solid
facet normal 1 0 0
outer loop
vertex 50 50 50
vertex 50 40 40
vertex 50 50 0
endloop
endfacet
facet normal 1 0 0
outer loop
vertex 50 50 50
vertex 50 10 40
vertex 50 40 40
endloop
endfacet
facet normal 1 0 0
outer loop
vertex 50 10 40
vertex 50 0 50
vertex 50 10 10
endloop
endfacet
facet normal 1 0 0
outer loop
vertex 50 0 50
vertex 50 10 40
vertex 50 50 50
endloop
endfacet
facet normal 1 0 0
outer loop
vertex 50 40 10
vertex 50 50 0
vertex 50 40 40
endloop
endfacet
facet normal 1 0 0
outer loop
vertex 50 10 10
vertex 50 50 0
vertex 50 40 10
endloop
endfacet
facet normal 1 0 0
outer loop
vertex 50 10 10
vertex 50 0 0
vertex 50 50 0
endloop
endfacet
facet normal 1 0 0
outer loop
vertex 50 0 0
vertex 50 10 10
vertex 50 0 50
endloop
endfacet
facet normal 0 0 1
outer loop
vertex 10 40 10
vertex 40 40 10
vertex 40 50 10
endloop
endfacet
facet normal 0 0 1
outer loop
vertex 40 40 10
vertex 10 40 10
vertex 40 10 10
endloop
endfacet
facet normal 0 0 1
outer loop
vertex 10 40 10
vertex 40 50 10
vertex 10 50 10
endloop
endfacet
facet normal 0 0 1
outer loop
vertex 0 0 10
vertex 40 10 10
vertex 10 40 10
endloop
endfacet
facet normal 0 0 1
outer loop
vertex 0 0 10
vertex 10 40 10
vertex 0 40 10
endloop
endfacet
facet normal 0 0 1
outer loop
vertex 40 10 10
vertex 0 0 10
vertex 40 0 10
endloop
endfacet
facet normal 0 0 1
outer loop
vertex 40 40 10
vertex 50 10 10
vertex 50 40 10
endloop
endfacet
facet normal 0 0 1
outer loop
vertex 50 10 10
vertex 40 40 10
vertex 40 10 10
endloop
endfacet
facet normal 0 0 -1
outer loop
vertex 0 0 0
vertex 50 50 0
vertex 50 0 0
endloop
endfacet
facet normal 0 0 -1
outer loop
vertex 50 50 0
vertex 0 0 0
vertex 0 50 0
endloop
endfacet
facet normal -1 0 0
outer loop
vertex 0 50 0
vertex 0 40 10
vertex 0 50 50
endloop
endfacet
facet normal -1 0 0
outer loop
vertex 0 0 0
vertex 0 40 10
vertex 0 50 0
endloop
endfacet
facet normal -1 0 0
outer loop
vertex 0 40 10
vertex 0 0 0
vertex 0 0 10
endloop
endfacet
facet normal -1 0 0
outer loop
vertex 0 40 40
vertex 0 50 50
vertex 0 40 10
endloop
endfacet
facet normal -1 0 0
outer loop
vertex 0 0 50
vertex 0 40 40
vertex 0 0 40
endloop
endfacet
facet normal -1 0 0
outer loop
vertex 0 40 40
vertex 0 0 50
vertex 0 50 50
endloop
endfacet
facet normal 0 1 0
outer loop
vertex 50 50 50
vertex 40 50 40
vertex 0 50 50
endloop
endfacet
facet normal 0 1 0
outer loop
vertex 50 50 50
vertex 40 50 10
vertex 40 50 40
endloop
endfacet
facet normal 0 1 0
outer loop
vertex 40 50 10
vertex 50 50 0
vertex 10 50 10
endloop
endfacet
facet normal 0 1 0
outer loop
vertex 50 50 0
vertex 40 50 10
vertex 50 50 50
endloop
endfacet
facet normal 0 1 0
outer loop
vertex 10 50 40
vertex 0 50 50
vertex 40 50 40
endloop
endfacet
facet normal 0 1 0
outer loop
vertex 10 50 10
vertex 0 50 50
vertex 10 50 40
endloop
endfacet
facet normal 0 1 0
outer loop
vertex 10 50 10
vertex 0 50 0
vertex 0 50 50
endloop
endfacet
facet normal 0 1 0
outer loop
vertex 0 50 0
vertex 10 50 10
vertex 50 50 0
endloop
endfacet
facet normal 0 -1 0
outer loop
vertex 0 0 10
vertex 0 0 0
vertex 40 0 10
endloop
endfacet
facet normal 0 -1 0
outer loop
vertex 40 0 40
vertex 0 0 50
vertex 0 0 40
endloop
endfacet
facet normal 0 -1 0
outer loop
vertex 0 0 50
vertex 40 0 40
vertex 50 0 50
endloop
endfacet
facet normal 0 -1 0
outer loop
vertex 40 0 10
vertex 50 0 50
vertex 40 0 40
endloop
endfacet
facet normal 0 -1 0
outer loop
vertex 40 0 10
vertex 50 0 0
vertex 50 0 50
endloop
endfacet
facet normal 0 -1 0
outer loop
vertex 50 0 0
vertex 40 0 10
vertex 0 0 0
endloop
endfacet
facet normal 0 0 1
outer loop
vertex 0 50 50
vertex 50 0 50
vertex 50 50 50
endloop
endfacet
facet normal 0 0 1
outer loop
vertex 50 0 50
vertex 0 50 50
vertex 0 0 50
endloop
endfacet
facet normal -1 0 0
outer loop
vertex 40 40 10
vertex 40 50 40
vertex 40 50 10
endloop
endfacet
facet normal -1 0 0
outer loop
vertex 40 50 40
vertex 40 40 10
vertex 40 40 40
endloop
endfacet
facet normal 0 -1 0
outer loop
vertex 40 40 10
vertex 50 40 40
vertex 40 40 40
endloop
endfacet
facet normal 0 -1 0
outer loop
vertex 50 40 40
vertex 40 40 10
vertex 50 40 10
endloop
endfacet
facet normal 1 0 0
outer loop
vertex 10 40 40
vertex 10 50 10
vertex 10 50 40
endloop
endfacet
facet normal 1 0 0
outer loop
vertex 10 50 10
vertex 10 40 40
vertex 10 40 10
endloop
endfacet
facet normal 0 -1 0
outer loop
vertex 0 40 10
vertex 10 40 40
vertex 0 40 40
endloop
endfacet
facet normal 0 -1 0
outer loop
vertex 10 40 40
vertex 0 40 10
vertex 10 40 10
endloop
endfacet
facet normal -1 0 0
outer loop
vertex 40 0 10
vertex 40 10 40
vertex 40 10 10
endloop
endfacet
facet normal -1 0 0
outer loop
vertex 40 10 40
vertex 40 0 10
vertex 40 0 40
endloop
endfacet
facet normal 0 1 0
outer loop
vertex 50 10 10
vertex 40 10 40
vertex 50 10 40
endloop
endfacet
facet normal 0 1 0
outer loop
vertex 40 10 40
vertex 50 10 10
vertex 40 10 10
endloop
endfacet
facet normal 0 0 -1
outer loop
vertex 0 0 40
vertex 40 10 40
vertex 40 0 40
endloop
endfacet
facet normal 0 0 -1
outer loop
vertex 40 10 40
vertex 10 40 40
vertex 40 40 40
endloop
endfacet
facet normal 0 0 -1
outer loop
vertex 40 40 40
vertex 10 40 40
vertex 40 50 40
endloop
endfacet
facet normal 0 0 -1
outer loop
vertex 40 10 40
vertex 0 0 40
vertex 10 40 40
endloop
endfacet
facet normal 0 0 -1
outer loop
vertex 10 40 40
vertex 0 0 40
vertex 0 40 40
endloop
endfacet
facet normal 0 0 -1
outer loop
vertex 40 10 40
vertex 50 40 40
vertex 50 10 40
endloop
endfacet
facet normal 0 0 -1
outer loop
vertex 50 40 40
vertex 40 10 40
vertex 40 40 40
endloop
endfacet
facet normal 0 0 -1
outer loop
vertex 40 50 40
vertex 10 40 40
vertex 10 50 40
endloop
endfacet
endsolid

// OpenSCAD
first_layer_height = 0.24;
layer_height = 0.08;

edge = 50;
pillars= 10;

translate( v = [0,
                0,
                0] ) {
    cube(
        [edge,
        edge,
        pillars,
        ],
        center=false);
}
    
translate( v = [edge - pillars,
                edge - pillars,
                0] ) {
    cube(
        [pillars,
        pillars,
        edge,
        ],
        center=false);
}

translate( v = [0,
                edge - pillars,
                0] ) {
    cube(
        [pillars,
        pillars,
        edge,
        ],
        center=false);
}

translate( v = [edge - pillars,
                0,
                0] ) {
    cube(
        [pillars,
        pillars,
        edge,
        ],
        center=false);
}

translate( v = [0,
                0, 
                edge - pillars] ) {
    cube(
        [edge,
        edge,
        pillars,
        ],
        center=false);
}
